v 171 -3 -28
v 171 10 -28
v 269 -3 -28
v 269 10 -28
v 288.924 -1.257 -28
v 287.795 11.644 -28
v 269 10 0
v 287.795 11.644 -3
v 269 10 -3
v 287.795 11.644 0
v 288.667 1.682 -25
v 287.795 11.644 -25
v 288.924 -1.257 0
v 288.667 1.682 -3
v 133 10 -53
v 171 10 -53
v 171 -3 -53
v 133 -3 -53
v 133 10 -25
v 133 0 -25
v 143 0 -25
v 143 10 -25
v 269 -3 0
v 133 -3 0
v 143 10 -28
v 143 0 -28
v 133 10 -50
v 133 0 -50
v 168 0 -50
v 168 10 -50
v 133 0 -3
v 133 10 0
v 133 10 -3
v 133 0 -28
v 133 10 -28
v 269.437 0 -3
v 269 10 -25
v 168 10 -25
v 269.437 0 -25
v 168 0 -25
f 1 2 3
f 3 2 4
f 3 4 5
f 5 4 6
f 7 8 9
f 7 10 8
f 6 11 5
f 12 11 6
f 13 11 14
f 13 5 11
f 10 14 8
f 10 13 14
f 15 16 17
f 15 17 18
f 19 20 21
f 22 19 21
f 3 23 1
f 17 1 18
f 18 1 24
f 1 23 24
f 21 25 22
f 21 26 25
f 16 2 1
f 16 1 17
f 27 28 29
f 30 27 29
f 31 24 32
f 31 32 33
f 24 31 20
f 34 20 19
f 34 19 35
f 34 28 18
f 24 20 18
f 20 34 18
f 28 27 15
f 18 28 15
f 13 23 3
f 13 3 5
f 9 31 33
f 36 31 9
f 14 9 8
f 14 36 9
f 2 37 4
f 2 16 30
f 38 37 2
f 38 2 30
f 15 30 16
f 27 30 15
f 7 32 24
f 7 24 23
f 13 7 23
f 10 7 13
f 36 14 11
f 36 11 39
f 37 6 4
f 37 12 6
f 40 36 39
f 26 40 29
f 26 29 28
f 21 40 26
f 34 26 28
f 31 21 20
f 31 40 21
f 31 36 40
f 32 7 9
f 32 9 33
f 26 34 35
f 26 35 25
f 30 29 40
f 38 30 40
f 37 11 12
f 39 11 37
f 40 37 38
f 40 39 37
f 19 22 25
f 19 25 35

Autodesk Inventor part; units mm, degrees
ref_plane "YZ Plane" through (0, 0, 0) normal (1, 0, 0) x (0, 1, 0)
ref_plane "XZ Plane" through (0, 0, 0) normal (0, 1, 0) x (-1, 0, 0)
sketch "Esboço1" plane through (0, 0, 0) normal (0, 1, 0) x (-1, 0, 0)
  line L0 (-133, -3) -> (0, -3)
  line L1 (0, -25) -> (-98, -25)
  line L2 (-133, 0) -> (-133, -28)
  line L3 (-133, -28) -> (-123, -28)
  line L4 (-95, -28) -> (0, -28)
  line L5 (0, -28) -> (0, 0)
  line L6 (0, 0) -> (-133, 0)
  line L7 (-95, -28) -> (-95, -53)
  line L8 (-95, -53) -> (-133, -53)
  line L9 (-133, -53) -> (-133, -50)
  line L10 (-133, -50) -> (-98, -50)
  line L11 (-98, -50) -> (-98, -25)
  arc A0 (-123, -50) -> (-98, -25) centre (-123, -25) ccw
  arc A1 (-123, -28) -> (-120, -25) centre (-123, -25) ccw
  line L12 (-133, -25) -> (-120, -25)
  line L13 (0, 0) -> (3, 0)
  line L14 (3, 0) -> (3, -28)
  line L15 (3, -28) -> (0, -28)
  line L16 (-123, -28) -> (-123, -25)
  line L17 (-133, -50) -> (-133, -28)
  line L18 (0, -3) -> (3, -3)
  line L19 (0, -25) -> (3, -25)
  line L20 (-133, -3) -> (-266, -3)
  line L21 (-266, -25) -> (-168, -25)
  line L22 (-133, -28) -> (-143, -28)
  line L23 (-171, -28) -> (-266, -28)
  line L24 (-266, -28) -> (-266, 0)
  line L25 (-266, 0) -> (-133, 0)
  line L26 (-171, -28) -> (-171, -53)
  line L27 (-171, -53) -> (-133, -53)
  line L28 (-133, -50) -> (-168, -50)
  line L29 (-168, -50) -> (-168, -25)
  arc A2 (-168, -25) -> (-143, -50) centre (-143, -25) ccw
  arc A3 (-146, -25) -> (-143, -28) centre (-143, -25) ccw
  line L30 (-133, -25) -> (-146, -25)
  line L31 (-266, 0) -> (-269, 0)
  line L32 (-269, 0) -> (-269, -28)
  line L33 (-269, -28) -> (-266, -28)
  line L34 (-143, -28) -> (-143, -25)
  line L35 (-266, -3) -> (-269, -3)
  line L36 (-266, -25) -> (-269, -25)
  point P0 (-133, -14)
  point P1 (-133, -51.5)
  point P2 (-83, -28)
  dimension "d7" = 22
  dimension "d9" = 3
  dimension "d10" = 3
  dimension "d13" = 3
  dimension "d14" = 3
  dimension "d16" = 22
  dimension "d20" = 22
  dimension "d21" = 120
  dimension "d29" = 3
  dimension "d31" = 10
extrude "Extrusão1" add sketch "Esboço1" against normal blind 3 contours L20 L24 L25 L2 | L2 L30 A3 L22 L17 L28 A2 L21 L24 L20 | L2 L22 L34 L30 | L35 L32 L31 L24 | L24 L36 L32 L35 | L34 A3 L30 | L21 L29 L28 L9 L27 L26 L23 L24 | L24 L33 L32 L36 | A2 L28 L29
extrude "Extrusão2" add sketch "Esboço1" along normal blind 10 contours L20 L24 L25 L2 | L2 L22 L34 L30 | L35 L32 L31 L24 | L21 L29 L28 L9 L27 L26 L23 L24 | L24 L33 L32 L36
sketch "Esboço2" plane through (133, -3, 0) normal (0, 0, 1) x (1, 0, 0)
  line L0 (0, 13) -> (136, 13) projected
  line L1 (136, 0) -> (0, 0) projected
  line L2 (136, 0) -> (155.9239, 1.7431)
  line L3 (136, 0) -> (156, 0) construction
  line L4 (155.9239, 1.7431) -> (154.7952, 14.6444)
  line L5 (154.7952, 14.6444) -> (136, 13)
  line L6 (136, 0) -> (136, 13) projected
  line L7 (136, 0) -> (136, 13)
  dimension "d32" = 20
  dimension "d33" = 5
extrude "Extrusão4" add sketch "Esboço2" against normal up to surface (28 mm away)
ref_plane "Plano de trabalho1" through (171, -3, -14) normal (0, 0, -1) x (-1, 0, 0)
sketch "Esboço3" plane through (171, -3, -14) normal (0, 0, -1) x (-1, 0, 0)
  line L0 (-116.7952, 14.6444) -> (-98, 13) projected
  line L1 (3, 13) -> (-98, 13) projected
  line L2 (-98, 0) -> (-117.9239, 1.7431) projected
  line L3 (-117.6667, 4.6824) -> (-98.4366, 3)
  line L4 (-98.4366, 3) -> (-98, 3)
  line L5 (-117.9239, 1.7431) -> (-116.7952, 14.6444) projected
  line L6 (-117.6667, 4.6824) -> (-116.7952, 14.6444)
  line L7 (-116.7952, 14.6444) -> (-98, 13)
  line L8 (-98, 13) -> (-98, 3)
  dimension "d36" = 10
extrude "Extrusão5" cut sketch "Esboço3" along normal mid plane 22
equation "\"d9\" = mdf"
equation "\"d10\" = mdf"
equation "\"d13\" = mdf"
equation "\"d14\" = mdf"
equation "\"mdf\" = 3"
equation "\"margem\" = 1"
properties part number "Trilho 5 min"
